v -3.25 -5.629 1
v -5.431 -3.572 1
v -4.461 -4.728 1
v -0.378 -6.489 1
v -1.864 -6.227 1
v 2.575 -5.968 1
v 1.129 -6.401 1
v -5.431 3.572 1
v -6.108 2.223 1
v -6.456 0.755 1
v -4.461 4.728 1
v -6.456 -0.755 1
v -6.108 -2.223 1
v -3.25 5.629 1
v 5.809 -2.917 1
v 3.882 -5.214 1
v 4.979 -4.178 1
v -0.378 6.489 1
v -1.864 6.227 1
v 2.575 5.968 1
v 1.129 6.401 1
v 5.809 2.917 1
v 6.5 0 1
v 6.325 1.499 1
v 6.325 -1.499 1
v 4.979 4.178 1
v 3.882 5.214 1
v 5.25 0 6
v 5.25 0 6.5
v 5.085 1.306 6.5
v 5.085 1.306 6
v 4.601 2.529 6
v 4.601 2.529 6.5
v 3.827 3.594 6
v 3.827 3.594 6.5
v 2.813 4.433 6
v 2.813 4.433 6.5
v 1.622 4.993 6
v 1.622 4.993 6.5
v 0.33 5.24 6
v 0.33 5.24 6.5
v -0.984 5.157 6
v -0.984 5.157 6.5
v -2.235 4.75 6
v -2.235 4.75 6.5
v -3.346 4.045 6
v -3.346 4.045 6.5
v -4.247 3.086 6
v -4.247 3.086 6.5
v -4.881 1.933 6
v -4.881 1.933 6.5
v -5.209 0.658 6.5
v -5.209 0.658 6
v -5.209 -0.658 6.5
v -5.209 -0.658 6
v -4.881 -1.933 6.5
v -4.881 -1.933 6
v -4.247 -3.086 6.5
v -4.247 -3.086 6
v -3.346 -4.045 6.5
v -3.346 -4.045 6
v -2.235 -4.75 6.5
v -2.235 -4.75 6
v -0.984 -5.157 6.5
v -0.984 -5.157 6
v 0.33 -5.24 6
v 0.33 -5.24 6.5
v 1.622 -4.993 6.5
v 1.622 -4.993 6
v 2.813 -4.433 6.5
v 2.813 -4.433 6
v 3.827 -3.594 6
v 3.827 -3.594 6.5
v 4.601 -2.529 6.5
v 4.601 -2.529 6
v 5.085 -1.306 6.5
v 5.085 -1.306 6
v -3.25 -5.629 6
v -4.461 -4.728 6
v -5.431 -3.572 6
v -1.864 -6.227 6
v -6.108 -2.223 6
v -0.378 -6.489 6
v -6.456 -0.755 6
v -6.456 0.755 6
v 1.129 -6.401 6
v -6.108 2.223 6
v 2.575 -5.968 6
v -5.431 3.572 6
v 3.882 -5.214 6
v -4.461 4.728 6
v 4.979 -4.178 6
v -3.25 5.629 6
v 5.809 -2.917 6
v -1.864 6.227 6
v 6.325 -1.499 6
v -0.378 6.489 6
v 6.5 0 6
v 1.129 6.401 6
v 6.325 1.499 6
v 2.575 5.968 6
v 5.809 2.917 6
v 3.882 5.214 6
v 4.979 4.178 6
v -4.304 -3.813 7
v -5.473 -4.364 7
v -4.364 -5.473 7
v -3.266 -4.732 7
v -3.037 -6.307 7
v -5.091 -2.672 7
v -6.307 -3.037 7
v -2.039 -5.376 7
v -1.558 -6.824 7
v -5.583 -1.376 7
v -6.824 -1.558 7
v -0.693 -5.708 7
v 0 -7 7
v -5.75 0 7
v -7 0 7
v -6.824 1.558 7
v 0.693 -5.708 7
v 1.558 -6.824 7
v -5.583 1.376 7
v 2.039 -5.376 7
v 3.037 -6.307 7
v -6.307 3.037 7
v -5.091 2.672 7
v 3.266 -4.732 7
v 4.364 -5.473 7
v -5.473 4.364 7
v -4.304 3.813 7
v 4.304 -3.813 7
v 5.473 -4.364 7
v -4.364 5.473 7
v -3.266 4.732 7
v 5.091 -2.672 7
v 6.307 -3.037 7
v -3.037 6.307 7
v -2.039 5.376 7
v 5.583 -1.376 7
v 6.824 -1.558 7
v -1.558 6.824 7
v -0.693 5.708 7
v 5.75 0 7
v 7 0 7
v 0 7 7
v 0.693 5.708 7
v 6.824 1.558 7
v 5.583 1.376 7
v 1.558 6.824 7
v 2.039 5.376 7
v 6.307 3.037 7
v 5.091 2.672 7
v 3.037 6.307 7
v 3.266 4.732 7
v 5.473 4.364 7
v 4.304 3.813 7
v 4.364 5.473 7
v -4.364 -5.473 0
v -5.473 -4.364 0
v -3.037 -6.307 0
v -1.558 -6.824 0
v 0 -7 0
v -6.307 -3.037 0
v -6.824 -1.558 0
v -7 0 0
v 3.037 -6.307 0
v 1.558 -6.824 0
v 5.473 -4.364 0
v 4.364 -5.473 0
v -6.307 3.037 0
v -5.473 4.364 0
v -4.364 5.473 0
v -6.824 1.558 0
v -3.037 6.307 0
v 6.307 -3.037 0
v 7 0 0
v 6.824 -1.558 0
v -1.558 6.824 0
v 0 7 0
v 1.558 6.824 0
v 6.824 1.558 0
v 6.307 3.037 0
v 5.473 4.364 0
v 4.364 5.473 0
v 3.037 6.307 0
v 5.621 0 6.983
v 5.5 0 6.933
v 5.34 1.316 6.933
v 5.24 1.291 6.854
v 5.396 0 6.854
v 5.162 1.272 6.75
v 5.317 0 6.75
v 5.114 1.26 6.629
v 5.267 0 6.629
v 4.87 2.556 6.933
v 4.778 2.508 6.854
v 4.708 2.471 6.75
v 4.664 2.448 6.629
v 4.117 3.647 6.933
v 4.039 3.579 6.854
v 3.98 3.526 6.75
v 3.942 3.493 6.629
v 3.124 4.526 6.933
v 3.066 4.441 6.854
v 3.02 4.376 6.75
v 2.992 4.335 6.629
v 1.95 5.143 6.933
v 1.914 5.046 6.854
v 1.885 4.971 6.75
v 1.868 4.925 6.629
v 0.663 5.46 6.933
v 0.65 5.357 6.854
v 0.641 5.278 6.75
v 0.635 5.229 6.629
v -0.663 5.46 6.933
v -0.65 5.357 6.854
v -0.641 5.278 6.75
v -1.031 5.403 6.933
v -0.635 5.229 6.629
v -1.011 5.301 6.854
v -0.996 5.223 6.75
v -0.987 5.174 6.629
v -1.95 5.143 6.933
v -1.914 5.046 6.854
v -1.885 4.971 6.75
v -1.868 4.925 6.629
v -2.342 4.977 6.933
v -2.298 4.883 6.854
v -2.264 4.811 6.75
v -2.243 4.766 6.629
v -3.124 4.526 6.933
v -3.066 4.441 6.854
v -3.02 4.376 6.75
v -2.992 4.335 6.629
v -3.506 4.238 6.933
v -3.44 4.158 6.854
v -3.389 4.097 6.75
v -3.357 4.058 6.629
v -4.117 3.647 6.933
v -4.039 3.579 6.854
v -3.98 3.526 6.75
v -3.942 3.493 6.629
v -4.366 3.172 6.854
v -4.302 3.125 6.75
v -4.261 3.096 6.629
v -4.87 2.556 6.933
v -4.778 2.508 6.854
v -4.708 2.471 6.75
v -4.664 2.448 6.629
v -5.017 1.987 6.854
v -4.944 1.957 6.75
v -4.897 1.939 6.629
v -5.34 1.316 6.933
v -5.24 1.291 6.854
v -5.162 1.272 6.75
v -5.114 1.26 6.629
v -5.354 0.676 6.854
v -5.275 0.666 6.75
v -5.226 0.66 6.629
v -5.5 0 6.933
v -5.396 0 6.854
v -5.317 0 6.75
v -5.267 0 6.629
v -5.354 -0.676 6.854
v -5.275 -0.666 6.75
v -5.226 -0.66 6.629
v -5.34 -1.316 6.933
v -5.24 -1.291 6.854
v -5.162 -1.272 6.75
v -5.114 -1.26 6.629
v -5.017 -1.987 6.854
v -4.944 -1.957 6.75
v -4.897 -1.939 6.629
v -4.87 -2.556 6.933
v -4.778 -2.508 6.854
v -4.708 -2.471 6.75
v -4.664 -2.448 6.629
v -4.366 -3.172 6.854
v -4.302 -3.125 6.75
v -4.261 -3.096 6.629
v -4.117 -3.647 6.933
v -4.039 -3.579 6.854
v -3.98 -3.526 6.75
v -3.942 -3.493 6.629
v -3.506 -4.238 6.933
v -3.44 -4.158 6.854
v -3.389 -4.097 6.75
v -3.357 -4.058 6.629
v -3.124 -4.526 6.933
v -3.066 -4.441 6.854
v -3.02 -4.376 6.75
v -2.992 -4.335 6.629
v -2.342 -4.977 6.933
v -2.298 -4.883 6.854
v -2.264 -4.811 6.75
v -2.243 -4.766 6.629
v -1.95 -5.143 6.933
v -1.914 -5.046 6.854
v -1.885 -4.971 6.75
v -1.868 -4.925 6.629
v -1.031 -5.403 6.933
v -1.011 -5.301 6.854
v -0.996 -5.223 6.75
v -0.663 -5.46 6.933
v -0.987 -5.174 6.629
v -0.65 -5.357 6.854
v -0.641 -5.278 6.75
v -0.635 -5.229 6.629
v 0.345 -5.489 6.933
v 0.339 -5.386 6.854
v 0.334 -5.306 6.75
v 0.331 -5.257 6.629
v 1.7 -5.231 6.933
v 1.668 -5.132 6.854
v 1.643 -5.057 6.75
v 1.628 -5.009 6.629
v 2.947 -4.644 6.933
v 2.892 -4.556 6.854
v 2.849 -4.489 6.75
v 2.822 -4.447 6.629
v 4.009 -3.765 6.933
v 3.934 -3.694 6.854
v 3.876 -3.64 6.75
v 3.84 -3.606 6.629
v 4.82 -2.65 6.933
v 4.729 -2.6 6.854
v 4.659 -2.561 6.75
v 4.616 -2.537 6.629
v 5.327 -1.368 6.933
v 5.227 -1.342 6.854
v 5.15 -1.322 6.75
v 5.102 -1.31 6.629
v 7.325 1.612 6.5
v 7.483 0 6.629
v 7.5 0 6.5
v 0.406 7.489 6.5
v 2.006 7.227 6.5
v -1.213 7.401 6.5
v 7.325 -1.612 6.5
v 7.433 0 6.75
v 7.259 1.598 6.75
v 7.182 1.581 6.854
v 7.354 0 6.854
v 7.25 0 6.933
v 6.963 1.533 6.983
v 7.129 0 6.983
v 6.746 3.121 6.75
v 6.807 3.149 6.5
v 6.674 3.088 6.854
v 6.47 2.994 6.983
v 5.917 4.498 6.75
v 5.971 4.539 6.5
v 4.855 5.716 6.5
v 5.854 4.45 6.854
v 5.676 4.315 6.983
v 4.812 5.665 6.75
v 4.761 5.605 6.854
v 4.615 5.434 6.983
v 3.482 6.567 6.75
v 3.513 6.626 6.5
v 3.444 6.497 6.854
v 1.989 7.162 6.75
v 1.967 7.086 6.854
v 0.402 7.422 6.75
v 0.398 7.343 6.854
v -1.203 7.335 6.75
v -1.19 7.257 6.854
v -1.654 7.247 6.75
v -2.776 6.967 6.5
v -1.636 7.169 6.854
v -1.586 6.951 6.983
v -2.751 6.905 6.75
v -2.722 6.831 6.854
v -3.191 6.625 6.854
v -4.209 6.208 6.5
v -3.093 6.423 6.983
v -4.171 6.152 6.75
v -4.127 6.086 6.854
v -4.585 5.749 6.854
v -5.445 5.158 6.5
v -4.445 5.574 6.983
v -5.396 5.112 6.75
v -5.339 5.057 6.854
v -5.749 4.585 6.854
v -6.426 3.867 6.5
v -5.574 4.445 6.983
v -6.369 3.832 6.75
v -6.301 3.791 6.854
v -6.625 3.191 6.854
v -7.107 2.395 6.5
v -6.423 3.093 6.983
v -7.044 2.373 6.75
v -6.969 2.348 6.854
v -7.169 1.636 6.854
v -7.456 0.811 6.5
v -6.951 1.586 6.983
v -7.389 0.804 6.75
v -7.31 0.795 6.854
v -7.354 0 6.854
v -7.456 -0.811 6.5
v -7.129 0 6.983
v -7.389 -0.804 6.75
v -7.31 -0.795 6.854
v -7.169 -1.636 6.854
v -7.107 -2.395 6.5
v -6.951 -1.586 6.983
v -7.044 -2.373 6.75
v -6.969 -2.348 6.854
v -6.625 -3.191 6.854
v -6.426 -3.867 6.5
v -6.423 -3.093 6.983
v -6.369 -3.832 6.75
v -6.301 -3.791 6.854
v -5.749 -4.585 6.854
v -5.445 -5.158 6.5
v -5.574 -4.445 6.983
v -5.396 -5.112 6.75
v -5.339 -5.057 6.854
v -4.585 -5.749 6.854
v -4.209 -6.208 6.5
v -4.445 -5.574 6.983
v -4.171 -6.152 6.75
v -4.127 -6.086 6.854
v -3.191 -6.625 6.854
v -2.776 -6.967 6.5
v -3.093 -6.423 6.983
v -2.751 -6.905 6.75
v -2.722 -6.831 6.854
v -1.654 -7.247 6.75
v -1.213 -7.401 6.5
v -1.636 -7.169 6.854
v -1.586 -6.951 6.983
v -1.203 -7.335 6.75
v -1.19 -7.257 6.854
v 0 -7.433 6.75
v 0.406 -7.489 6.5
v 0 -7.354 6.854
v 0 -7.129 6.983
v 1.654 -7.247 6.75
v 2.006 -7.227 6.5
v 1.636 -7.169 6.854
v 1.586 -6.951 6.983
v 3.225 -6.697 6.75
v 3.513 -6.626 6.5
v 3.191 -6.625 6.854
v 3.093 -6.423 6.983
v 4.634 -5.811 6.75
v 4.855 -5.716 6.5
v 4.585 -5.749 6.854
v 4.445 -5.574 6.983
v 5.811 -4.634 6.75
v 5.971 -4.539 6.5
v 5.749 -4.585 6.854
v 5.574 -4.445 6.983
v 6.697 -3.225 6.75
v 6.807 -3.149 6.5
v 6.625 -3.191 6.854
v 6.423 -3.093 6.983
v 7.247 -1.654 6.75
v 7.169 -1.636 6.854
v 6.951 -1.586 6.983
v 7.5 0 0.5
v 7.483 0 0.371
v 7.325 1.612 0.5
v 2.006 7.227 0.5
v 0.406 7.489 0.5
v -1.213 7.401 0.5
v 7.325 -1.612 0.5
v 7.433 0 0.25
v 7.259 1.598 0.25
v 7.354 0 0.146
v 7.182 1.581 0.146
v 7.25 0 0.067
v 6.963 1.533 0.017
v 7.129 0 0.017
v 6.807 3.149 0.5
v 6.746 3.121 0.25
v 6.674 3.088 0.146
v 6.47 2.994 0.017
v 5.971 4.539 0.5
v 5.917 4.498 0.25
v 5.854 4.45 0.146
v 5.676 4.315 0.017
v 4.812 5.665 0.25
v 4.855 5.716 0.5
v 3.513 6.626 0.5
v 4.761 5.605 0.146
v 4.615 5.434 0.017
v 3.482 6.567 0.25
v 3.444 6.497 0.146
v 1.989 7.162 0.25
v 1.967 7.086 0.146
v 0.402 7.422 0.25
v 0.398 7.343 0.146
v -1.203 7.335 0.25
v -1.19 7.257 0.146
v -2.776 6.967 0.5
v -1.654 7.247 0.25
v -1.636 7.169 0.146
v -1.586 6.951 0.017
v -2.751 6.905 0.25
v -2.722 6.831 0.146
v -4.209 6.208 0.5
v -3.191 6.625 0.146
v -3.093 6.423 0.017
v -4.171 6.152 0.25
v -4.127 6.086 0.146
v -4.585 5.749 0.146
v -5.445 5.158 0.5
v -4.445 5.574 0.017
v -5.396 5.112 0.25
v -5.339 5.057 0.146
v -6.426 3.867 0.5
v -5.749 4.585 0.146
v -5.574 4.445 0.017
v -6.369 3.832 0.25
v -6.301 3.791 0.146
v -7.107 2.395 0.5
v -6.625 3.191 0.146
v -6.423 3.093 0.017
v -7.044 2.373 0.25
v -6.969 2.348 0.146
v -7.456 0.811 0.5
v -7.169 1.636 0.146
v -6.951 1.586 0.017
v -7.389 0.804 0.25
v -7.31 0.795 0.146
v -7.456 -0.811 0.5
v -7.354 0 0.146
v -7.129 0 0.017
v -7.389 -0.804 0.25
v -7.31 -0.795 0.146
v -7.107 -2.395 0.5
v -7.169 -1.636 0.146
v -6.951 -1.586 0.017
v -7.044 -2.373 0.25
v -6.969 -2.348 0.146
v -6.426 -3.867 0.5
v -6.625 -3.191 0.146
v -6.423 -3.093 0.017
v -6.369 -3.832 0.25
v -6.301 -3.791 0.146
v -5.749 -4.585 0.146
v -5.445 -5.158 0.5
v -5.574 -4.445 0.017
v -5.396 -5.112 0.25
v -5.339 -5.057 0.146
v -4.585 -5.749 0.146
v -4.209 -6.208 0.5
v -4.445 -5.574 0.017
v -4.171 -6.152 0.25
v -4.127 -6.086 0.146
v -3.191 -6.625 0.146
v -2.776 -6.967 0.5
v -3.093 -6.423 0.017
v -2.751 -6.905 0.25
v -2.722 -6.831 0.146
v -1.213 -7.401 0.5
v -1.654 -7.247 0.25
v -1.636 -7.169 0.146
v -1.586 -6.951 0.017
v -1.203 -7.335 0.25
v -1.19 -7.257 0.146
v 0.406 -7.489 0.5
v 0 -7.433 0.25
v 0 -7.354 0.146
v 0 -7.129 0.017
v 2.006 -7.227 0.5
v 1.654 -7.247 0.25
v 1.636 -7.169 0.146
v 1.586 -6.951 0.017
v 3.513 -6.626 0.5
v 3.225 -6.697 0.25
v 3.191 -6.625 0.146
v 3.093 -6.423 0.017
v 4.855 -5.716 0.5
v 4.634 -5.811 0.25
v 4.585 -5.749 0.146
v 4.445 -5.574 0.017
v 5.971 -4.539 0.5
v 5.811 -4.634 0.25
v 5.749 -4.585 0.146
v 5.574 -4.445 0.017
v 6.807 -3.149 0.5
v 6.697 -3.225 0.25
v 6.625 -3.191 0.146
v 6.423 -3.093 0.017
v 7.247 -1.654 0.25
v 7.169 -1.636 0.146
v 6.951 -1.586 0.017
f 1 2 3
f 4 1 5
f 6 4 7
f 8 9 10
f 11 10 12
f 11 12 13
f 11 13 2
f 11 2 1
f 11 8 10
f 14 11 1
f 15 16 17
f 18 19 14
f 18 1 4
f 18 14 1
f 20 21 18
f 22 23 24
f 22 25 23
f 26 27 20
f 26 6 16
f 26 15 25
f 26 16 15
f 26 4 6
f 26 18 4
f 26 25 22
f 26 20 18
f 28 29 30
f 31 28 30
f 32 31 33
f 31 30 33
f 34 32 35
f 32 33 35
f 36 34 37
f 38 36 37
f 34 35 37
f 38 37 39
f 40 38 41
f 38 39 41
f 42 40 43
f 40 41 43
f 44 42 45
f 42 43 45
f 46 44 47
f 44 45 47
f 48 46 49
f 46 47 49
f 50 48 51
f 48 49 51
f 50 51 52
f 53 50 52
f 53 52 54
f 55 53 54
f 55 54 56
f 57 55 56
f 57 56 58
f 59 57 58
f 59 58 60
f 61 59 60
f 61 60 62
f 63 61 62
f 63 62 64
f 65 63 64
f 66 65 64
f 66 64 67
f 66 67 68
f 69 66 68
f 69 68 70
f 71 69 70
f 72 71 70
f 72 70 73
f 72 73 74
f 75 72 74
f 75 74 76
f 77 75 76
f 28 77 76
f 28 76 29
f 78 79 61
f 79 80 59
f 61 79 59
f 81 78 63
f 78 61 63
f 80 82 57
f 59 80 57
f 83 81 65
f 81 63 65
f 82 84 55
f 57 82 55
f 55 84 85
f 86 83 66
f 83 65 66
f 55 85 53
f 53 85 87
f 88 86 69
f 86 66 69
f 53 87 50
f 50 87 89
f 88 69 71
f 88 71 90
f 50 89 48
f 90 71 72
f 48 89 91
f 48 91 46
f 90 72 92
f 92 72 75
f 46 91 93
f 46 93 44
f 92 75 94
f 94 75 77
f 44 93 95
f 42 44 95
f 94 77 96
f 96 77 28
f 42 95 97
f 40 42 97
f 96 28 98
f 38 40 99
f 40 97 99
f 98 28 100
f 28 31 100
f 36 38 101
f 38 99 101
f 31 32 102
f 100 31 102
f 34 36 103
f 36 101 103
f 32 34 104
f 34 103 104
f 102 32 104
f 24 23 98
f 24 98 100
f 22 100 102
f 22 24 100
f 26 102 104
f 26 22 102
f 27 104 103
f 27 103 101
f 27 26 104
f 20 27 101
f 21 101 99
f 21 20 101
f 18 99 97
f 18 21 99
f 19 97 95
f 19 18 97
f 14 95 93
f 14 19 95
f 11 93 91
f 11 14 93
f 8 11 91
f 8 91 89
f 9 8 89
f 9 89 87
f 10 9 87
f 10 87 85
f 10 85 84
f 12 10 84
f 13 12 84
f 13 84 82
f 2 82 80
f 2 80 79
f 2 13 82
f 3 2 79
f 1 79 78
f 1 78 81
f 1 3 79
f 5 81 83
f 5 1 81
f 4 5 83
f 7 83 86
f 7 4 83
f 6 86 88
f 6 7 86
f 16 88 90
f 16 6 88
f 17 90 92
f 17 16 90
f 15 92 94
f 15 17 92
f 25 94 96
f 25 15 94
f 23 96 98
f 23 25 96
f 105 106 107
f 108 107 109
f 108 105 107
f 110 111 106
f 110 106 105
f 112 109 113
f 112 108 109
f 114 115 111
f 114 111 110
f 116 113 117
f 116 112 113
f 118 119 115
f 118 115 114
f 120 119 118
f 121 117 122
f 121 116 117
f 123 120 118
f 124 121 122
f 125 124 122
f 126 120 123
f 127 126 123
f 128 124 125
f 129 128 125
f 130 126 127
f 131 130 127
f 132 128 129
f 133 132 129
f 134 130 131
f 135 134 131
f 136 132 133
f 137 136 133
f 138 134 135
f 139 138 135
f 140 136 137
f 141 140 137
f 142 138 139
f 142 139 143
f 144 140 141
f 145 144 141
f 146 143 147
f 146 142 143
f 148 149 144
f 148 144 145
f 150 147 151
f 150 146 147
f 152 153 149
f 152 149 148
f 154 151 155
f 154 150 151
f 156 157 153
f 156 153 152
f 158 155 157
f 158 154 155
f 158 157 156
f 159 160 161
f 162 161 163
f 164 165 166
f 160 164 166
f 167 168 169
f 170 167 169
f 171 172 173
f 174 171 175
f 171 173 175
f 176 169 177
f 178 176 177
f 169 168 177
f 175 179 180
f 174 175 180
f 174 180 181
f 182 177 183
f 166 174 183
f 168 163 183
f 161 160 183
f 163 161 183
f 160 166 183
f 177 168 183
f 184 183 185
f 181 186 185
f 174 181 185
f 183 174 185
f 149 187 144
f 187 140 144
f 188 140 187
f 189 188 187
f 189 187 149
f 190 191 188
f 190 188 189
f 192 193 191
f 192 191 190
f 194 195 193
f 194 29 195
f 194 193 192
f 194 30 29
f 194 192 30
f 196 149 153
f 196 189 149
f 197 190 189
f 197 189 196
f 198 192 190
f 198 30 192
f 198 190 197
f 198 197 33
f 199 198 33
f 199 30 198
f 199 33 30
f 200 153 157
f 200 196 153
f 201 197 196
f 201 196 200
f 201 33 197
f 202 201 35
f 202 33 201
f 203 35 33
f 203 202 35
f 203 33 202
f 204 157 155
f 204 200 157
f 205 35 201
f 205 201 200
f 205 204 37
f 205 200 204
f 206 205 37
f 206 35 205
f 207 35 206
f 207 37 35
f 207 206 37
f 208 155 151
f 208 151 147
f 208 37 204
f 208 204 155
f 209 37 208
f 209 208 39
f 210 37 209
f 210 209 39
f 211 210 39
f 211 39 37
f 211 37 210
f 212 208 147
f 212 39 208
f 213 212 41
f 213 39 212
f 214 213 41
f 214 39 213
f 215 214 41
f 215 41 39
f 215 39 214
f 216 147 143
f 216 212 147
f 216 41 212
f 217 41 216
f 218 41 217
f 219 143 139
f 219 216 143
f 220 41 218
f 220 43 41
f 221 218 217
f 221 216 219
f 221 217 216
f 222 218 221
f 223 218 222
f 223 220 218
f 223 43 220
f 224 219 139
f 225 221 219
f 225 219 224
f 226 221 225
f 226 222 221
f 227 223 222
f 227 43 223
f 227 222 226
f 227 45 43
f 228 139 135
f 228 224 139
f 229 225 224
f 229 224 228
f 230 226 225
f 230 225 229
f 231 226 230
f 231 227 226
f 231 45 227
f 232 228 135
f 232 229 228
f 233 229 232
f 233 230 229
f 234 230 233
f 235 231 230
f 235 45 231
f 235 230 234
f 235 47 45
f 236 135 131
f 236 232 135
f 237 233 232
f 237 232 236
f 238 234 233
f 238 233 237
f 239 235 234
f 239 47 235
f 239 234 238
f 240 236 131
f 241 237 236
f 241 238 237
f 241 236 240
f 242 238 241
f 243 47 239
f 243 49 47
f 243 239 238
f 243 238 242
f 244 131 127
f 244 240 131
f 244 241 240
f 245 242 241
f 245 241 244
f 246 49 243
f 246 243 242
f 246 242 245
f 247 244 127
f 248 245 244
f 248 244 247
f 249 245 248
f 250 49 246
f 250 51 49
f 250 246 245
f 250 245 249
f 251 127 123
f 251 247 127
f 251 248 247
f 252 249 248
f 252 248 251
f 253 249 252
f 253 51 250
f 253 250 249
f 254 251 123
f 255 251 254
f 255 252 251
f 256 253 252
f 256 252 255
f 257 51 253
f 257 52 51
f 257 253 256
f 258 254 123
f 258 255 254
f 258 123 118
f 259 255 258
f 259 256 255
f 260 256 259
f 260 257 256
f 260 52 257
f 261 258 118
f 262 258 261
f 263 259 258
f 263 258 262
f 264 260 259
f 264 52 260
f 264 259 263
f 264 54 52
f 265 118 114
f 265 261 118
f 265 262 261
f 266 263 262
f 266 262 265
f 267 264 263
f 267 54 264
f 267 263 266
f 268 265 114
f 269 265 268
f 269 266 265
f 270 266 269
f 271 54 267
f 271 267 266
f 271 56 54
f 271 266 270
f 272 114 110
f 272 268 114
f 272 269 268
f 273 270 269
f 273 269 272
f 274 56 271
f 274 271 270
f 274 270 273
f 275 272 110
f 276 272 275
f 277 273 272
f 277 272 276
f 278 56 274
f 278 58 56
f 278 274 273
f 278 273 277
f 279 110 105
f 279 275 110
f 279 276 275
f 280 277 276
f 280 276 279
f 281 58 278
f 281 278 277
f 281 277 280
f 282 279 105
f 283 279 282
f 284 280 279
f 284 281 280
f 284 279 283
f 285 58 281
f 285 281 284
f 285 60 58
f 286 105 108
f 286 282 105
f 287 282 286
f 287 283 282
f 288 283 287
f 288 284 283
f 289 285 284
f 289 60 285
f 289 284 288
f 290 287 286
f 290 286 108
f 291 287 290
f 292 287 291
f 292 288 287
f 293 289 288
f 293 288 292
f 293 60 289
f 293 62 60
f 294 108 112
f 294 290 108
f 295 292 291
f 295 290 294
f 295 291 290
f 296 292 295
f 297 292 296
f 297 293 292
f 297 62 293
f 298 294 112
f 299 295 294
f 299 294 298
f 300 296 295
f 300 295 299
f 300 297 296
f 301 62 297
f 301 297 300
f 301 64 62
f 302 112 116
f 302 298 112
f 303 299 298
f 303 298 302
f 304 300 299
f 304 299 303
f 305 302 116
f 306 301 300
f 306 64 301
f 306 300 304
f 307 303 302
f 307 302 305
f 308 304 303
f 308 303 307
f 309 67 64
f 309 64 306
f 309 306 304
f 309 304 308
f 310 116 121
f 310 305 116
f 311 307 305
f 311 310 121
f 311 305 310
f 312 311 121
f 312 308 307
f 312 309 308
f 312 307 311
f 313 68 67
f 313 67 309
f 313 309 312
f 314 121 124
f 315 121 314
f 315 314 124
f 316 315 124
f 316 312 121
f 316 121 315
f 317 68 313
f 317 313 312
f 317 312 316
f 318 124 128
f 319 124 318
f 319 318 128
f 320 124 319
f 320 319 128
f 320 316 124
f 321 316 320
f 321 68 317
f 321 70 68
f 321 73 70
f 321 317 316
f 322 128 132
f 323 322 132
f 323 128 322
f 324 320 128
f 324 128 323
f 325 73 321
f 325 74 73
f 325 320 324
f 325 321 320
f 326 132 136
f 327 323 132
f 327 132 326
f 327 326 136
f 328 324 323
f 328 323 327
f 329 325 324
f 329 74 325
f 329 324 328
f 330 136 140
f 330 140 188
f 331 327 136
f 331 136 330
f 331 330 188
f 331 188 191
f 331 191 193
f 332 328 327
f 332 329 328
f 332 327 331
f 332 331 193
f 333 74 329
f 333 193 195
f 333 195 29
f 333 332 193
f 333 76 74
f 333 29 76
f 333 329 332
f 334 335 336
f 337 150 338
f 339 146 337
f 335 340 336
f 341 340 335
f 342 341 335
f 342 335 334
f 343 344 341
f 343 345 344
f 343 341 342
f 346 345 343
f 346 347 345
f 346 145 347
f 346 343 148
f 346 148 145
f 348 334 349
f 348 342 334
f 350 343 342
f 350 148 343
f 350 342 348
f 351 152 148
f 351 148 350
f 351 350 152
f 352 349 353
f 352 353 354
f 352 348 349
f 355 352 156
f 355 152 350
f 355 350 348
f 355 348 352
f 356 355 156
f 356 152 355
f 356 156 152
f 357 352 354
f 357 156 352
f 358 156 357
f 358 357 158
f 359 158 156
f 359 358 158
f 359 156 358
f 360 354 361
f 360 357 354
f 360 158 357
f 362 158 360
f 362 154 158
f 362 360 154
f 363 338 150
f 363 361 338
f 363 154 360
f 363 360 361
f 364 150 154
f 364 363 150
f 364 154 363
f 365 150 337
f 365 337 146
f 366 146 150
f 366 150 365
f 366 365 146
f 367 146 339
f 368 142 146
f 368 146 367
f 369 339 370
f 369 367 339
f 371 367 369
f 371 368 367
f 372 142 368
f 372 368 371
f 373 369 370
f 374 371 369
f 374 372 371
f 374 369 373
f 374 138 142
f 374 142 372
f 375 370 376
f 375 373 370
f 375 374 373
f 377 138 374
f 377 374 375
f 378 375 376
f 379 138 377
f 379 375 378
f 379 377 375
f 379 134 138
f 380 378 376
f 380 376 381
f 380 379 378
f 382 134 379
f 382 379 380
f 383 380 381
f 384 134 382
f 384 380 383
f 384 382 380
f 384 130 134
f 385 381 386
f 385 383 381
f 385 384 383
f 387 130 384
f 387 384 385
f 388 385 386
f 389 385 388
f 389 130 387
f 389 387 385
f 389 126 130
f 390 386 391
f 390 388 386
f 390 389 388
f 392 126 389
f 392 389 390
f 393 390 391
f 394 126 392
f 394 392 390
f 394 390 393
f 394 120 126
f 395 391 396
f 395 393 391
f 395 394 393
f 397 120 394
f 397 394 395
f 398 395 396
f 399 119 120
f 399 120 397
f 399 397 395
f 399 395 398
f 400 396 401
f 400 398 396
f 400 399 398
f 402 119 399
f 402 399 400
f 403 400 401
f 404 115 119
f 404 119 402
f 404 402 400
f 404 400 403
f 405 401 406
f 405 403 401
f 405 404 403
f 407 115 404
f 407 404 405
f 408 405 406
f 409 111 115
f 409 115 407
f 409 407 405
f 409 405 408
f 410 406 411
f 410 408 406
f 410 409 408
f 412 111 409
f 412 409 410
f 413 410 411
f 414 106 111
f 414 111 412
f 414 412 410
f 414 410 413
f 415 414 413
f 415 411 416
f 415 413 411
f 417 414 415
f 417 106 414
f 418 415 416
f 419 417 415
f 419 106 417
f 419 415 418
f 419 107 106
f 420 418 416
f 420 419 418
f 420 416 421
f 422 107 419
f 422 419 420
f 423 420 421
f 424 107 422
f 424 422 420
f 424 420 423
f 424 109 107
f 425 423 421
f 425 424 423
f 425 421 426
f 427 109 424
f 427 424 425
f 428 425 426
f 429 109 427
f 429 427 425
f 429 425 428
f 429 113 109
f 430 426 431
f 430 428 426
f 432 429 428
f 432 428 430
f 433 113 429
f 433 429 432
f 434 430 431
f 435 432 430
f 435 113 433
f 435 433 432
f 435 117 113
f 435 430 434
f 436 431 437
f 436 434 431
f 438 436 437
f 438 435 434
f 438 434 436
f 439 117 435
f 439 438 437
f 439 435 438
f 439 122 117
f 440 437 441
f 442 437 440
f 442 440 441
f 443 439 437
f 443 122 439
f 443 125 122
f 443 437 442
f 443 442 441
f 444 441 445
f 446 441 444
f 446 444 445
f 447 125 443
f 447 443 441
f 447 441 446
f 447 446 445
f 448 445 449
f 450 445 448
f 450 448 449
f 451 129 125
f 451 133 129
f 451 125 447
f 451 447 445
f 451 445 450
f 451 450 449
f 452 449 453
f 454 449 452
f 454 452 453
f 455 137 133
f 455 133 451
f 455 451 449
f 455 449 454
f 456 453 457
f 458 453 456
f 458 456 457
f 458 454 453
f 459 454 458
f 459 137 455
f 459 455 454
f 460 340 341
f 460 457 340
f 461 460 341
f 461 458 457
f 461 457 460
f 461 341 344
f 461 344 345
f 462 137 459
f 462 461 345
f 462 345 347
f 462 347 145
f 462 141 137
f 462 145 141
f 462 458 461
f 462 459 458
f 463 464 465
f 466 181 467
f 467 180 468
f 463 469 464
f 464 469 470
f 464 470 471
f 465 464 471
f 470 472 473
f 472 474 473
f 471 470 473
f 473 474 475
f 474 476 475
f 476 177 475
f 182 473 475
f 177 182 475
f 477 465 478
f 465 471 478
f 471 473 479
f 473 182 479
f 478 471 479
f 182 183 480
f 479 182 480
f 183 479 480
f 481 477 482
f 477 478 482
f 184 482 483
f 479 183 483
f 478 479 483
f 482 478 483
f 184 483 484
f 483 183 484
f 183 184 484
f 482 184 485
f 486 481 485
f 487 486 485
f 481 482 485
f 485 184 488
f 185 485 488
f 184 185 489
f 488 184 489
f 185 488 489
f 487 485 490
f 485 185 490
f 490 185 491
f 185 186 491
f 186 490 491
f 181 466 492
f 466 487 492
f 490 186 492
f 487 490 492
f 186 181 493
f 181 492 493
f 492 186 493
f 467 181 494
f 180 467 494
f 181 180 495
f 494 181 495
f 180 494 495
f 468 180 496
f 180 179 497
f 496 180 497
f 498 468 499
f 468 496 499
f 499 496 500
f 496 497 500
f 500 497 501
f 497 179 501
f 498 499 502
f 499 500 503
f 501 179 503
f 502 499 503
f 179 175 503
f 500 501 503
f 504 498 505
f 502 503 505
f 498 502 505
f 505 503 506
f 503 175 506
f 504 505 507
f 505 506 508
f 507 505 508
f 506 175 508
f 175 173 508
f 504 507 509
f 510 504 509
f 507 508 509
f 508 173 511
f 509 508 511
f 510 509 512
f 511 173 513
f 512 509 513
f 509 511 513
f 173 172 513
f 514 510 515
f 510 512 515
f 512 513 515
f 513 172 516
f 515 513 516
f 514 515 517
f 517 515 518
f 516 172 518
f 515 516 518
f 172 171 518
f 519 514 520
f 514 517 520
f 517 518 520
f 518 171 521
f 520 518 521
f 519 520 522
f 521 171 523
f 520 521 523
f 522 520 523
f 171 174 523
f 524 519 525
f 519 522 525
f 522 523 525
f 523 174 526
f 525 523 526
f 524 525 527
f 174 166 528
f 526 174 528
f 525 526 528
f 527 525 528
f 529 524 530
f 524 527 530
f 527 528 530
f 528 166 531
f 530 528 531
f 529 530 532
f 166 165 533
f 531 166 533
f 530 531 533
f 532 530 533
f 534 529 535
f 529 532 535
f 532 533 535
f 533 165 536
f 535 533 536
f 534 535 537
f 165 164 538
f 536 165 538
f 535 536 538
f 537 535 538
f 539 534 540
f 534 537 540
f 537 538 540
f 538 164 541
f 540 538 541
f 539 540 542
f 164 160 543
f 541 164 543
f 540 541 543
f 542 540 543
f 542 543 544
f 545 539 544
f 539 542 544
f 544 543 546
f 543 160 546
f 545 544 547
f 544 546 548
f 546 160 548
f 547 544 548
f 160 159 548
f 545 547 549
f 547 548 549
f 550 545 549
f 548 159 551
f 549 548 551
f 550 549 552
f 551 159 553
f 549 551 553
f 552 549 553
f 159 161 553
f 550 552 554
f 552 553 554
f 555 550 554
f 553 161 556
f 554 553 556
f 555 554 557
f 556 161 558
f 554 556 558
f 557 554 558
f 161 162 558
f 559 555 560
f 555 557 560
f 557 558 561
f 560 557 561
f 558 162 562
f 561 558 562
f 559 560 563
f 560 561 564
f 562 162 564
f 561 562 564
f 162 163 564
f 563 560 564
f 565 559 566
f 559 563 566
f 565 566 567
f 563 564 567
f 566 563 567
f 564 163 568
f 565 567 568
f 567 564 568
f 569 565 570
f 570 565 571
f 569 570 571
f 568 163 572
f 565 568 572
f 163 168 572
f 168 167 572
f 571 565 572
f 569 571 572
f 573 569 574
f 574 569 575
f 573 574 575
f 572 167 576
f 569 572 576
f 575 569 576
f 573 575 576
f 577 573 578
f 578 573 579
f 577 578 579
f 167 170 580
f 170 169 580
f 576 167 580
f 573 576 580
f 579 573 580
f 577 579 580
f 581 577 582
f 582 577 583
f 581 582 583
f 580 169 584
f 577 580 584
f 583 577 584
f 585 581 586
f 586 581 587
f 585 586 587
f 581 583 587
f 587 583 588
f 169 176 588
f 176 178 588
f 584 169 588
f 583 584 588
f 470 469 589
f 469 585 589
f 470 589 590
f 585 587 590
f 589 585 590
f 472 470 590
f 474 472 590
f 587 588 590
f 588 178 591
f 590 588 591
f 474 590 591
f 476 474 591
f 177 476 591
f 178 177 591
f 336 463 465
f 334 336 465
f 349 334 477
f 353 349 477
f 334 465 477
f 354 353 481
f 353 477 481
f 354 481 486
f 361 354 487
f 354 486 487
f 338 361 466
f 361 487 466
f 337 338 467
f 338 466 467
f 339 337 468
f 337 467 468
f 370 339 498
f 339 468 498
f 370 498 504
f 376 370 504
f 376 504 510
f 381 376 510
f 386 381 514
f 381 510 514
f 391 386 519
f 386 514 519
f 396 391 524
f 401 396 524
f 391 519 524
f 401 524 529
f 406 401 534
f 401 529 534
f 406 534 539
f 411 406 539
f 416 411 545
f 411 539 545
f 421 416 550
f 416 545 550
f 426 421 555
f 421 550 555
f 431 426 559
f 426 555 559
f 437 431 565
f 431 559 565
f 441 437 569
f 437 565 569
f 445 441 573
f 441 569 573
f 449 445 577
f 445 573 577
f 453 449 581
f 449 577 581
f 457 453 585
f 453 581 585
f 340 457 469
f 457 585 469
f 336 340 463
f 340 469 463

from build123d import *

# Parameters (mm, degrees)
SKETCH_1_R          = 7.5
EXTRUDE_1_DEPTH     = 7
SKETCH_2_R          = 5.25
CUT_EXTRUDE_1_DEPTH = 6
SKETCH_3_R          = 6.5
CUT_EXTRUDE_2_DEPTH = 5
FILLET_1_R          = 0.5


with BuildPart() as part:
    # 草图1 → 凸台-拉伸1 (new body)
    with BuildSketch(Plane.XY):
        Circle(SKETCH_1_R)
    extrude(amount=EXTRUDE_1_DEPTH)

    # 草图2 → 切除-拉伸1 (cut)
    with BuildSketch(Plane.XY.offset(7)):
        Circle(SKETCH_2_R)
    extrude(amount=-CUT_EXTRUDE_1_DEPTH, mode=Mode.SUBTRACT)

    # 草图3 → 切除-拉伸2 (cut)
    with BuildSketch(Plane.XY.offset(1)):
        Circle(SKETCH_3_R)
    extrude(amount=CUT_EXTRUDE_2_DEPTH, mode=Mode.SUBTRACT)

    # 圆角1
    fillet_1_edges = [part.edges().sort_by_distance(p)[0] for p in [
        (-7.5, 0, 0),
        (-7.5, 0, 7),
        (-5.25, 0, 7),
    ]]
    fillet(fillet_1_edges, radius=FILLET_1_R)


solid = part.part
